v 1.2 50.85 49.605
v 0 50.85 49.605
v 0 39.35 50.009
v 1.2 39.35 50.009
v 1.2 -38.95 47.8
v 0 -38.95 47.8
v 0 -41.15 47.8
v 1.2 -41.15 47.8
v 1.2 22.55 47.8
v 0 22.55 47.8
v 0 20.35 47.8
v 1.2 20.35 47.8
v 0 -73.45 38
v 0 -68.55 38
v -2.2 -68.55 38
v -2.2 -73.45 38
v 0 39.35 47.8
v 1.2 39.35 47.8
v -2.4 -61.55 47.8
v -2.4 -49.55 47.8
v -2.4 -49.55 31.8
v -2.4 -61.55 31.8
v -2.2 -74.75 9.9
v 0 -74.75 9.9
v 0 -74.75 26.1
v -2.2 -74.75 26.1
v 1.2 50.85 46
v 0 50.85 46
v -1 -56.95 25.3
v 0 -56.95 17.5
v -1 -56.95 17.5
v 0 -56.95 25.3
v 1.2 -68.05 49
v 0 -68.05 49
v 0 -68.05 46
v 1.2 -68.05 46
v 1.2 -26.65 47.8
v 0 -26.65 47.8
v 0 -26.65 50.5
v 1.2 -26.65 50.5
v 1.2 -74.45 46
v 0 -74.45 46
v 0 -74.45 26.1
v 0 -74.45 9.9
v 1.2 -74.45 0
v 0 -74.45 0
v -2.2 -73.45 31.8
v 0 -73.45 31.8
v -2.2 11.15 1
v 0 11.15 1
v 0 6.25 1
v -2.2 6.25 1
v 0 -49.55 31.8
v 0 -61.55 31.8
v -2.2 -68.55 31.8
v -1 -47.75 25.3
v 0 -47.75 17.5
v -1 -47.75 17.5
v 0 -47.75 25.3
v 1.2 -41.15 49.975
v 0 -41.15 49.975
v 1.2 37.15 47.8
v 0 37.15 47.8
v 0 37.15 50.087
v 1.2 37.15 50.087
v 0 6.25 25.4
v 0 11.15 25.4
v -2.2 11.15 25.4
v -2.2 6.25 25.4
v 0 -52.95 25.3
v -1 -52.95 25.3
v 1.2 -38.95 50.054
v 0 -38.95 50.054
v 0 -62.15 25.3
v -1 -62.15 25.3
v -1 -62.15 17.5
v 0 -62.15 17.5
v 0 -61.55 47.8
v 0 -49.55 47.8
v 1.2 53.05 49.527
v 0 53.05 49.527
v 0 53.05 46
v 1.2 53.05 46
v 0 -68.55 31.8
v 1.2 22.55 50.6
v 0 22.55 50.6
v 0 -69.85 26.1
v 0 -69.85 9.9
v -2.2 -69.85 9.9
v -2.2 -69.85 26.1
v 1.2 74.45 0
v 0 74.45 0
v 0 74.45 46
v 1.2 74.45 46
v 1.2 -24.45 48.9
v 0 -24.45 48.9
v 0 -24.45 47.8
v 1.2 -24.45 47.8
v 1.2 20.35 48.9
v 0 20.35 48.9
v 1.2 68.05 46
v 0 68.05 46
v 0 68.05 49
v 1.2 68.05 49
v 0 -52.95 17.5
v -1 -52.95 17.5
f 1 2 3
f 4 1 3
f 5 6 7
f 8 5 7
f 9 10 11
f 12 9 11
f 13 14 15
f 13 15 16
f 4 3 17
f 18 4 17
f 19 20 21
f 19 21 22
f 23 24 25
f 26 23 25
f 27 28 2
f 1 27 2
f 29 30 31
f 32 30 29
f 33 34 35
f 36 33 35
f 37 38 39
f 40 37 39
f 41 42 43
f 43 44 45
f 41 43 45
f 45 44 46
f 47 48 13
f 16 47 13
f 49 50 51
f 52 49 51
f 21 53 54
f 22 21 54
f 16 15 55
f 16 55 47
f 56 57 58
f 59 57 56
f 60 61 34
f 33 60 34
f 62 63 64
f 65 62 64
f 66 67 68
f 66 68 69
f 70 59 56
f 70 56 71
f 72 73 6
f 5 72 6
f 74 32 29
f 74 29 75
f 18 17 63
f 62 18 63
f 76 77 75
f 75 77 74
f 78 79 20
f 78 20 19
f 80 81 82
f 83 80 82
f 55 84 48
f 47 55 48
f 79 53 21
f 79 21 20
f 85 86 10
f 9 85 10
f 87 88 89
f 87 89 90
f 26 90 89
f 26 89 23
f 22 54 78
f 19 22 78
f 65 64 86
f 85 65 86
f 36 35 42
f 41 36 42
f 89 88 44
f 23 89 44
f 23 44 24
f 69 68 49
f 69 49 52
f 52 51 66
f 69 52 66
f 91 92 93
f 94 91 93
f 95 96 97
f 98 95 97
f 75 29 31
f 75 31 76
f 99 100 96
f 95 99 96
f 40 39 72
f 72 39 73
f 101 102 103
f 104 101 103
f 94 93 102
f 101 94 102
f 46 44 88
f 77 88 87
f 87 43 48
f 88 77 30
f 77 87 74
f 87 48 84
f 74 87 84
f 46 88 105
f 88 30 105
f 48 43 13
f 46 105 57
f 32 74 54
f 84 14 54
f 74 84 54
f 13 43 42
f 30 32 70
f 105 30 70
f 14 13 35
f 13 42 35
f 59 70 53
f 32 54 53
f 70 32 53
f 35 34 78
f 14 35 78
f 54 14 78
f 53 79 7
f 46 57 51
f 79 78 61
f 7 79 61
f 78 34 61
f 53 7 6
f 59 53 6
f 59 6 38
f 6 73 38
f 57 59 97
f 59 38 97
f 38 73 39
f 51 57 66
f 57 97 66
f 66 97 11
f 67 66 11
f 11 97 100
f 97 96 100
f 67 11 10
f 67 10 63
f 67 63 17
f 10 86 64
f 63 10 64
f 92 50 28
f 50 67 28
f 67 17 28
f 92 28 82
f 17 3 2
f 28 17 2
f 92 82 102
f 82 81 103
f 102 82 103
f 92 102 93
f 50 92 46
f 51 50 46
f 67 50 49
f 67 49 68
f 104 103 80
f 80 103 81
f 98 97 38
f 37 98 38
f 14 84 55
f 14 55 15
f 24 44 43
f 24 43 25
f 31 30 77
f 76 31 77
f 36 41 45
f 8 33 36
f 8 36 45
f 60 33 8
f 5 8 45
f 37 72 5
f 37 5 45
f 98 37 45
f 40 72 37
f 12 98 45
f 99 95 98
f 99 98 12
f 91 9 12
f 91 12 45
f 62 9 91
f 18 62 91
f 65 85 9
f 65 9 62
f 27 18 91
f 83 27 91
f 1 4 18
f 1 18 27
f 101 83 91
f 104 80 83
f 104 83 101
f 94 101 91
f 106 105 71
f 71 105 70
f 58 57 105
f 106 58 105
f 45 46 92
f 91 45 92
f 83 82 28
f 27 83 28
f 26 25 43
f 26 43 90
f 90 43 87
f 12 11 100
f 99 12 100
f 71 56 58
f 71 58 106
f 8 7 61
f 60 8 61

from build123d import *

# Parameters (mm, degrees)
F1_DEPTH = 1.2
F2_W     = 4.9
F2_H     = 6.2
F2_W_2   = 4.6
F2_H_2   = 16.2
F2_W_3   = 0.3
F2_H_3   = 24.4
F4_DEPTH = 2.2
F2_W_4   = 12
F2_H_4   = 16
F5_DEPTH = 2.4
F2_W_5   = 5.2
F2_H_5   = 7.8
F6_DEPTH = 1


with BuildPart() as f1:
    # F0 (on Right) → F1 (new body)
    with BuildSketch(Plane.YZ):
        Polygon((74.45, 0), (74.45, 46), (68.05, 46), (68.05, 49), (53.05, 49.527473), (53.05, 46), (50.85, 46), (50.85, 49.604835), (39.35, 50.009231), (39.35, 47.8), (37.15, 47.8), (37.15, 50.086593), (22.55, 50.6), (22.55, 47.8), (20.35, 47.8), (20.35, 48.9), (-24.45, 48.9), (-24.45, 47.8), (-26.65, 47.8), (-26.65, 50.5), (-38.95, 50.054348), (-38.95, 47.8), (-41.15, 47.8), (-41.15, 49.974638), (-68.05, 49), (-68.05, 46), (-74.45, 46), (-74.45, 0), align=None)
    extrude(amount=F1_DEPTH)

    # F2 (on face) → F4 (join)
    with BuildSketch(Plane(origin=(0, 0, 0), x_dir=(0, -1, 0), z_dir=(-1, 0, 0))):
        with Locations((71, 34.9)):
            Rectangle(F2_W, F2_H)
        with Locations((72.15, 18)):
            Rectangle(F2_W_2, F2_H_2)
        with Locations((74.6, 18)):
            Rectangle(F2_W_3, F2_H_2)
        with Locations((-8.7, 13.2)):
            Rectangle(F2_W, F2_H_3)
    extrude(amount=F4_DEPTH)

    # F2 (on face) → F5 (join)
    with BuildSketch(Plane(origin=(0, 0, 0), x_dir=(0, -1, 0), z_dir=(-1, 0, 0))):
        with Locations((55.55, 39.8)):
            Rectangle(F2_W_4, F2_H_4)
    extrude(amount=F5_DEPTH)

    # F2 (on face) → F6 (join)
    with BuildSketch(Plane(origin=(0, 0, 0), x_dir=(0, -1, 0), z_dir=(-1, 0, 0))):
        with Locations((50.35, 21.4)):
            Rectangle(F2_W_5, F2_H_5)
        with Locations((59.55, 21.4)):
            Rectangle(F2_W_5, F2_H_5)
    extrude(amount=F6_DEPTH)


solid = f1.part
